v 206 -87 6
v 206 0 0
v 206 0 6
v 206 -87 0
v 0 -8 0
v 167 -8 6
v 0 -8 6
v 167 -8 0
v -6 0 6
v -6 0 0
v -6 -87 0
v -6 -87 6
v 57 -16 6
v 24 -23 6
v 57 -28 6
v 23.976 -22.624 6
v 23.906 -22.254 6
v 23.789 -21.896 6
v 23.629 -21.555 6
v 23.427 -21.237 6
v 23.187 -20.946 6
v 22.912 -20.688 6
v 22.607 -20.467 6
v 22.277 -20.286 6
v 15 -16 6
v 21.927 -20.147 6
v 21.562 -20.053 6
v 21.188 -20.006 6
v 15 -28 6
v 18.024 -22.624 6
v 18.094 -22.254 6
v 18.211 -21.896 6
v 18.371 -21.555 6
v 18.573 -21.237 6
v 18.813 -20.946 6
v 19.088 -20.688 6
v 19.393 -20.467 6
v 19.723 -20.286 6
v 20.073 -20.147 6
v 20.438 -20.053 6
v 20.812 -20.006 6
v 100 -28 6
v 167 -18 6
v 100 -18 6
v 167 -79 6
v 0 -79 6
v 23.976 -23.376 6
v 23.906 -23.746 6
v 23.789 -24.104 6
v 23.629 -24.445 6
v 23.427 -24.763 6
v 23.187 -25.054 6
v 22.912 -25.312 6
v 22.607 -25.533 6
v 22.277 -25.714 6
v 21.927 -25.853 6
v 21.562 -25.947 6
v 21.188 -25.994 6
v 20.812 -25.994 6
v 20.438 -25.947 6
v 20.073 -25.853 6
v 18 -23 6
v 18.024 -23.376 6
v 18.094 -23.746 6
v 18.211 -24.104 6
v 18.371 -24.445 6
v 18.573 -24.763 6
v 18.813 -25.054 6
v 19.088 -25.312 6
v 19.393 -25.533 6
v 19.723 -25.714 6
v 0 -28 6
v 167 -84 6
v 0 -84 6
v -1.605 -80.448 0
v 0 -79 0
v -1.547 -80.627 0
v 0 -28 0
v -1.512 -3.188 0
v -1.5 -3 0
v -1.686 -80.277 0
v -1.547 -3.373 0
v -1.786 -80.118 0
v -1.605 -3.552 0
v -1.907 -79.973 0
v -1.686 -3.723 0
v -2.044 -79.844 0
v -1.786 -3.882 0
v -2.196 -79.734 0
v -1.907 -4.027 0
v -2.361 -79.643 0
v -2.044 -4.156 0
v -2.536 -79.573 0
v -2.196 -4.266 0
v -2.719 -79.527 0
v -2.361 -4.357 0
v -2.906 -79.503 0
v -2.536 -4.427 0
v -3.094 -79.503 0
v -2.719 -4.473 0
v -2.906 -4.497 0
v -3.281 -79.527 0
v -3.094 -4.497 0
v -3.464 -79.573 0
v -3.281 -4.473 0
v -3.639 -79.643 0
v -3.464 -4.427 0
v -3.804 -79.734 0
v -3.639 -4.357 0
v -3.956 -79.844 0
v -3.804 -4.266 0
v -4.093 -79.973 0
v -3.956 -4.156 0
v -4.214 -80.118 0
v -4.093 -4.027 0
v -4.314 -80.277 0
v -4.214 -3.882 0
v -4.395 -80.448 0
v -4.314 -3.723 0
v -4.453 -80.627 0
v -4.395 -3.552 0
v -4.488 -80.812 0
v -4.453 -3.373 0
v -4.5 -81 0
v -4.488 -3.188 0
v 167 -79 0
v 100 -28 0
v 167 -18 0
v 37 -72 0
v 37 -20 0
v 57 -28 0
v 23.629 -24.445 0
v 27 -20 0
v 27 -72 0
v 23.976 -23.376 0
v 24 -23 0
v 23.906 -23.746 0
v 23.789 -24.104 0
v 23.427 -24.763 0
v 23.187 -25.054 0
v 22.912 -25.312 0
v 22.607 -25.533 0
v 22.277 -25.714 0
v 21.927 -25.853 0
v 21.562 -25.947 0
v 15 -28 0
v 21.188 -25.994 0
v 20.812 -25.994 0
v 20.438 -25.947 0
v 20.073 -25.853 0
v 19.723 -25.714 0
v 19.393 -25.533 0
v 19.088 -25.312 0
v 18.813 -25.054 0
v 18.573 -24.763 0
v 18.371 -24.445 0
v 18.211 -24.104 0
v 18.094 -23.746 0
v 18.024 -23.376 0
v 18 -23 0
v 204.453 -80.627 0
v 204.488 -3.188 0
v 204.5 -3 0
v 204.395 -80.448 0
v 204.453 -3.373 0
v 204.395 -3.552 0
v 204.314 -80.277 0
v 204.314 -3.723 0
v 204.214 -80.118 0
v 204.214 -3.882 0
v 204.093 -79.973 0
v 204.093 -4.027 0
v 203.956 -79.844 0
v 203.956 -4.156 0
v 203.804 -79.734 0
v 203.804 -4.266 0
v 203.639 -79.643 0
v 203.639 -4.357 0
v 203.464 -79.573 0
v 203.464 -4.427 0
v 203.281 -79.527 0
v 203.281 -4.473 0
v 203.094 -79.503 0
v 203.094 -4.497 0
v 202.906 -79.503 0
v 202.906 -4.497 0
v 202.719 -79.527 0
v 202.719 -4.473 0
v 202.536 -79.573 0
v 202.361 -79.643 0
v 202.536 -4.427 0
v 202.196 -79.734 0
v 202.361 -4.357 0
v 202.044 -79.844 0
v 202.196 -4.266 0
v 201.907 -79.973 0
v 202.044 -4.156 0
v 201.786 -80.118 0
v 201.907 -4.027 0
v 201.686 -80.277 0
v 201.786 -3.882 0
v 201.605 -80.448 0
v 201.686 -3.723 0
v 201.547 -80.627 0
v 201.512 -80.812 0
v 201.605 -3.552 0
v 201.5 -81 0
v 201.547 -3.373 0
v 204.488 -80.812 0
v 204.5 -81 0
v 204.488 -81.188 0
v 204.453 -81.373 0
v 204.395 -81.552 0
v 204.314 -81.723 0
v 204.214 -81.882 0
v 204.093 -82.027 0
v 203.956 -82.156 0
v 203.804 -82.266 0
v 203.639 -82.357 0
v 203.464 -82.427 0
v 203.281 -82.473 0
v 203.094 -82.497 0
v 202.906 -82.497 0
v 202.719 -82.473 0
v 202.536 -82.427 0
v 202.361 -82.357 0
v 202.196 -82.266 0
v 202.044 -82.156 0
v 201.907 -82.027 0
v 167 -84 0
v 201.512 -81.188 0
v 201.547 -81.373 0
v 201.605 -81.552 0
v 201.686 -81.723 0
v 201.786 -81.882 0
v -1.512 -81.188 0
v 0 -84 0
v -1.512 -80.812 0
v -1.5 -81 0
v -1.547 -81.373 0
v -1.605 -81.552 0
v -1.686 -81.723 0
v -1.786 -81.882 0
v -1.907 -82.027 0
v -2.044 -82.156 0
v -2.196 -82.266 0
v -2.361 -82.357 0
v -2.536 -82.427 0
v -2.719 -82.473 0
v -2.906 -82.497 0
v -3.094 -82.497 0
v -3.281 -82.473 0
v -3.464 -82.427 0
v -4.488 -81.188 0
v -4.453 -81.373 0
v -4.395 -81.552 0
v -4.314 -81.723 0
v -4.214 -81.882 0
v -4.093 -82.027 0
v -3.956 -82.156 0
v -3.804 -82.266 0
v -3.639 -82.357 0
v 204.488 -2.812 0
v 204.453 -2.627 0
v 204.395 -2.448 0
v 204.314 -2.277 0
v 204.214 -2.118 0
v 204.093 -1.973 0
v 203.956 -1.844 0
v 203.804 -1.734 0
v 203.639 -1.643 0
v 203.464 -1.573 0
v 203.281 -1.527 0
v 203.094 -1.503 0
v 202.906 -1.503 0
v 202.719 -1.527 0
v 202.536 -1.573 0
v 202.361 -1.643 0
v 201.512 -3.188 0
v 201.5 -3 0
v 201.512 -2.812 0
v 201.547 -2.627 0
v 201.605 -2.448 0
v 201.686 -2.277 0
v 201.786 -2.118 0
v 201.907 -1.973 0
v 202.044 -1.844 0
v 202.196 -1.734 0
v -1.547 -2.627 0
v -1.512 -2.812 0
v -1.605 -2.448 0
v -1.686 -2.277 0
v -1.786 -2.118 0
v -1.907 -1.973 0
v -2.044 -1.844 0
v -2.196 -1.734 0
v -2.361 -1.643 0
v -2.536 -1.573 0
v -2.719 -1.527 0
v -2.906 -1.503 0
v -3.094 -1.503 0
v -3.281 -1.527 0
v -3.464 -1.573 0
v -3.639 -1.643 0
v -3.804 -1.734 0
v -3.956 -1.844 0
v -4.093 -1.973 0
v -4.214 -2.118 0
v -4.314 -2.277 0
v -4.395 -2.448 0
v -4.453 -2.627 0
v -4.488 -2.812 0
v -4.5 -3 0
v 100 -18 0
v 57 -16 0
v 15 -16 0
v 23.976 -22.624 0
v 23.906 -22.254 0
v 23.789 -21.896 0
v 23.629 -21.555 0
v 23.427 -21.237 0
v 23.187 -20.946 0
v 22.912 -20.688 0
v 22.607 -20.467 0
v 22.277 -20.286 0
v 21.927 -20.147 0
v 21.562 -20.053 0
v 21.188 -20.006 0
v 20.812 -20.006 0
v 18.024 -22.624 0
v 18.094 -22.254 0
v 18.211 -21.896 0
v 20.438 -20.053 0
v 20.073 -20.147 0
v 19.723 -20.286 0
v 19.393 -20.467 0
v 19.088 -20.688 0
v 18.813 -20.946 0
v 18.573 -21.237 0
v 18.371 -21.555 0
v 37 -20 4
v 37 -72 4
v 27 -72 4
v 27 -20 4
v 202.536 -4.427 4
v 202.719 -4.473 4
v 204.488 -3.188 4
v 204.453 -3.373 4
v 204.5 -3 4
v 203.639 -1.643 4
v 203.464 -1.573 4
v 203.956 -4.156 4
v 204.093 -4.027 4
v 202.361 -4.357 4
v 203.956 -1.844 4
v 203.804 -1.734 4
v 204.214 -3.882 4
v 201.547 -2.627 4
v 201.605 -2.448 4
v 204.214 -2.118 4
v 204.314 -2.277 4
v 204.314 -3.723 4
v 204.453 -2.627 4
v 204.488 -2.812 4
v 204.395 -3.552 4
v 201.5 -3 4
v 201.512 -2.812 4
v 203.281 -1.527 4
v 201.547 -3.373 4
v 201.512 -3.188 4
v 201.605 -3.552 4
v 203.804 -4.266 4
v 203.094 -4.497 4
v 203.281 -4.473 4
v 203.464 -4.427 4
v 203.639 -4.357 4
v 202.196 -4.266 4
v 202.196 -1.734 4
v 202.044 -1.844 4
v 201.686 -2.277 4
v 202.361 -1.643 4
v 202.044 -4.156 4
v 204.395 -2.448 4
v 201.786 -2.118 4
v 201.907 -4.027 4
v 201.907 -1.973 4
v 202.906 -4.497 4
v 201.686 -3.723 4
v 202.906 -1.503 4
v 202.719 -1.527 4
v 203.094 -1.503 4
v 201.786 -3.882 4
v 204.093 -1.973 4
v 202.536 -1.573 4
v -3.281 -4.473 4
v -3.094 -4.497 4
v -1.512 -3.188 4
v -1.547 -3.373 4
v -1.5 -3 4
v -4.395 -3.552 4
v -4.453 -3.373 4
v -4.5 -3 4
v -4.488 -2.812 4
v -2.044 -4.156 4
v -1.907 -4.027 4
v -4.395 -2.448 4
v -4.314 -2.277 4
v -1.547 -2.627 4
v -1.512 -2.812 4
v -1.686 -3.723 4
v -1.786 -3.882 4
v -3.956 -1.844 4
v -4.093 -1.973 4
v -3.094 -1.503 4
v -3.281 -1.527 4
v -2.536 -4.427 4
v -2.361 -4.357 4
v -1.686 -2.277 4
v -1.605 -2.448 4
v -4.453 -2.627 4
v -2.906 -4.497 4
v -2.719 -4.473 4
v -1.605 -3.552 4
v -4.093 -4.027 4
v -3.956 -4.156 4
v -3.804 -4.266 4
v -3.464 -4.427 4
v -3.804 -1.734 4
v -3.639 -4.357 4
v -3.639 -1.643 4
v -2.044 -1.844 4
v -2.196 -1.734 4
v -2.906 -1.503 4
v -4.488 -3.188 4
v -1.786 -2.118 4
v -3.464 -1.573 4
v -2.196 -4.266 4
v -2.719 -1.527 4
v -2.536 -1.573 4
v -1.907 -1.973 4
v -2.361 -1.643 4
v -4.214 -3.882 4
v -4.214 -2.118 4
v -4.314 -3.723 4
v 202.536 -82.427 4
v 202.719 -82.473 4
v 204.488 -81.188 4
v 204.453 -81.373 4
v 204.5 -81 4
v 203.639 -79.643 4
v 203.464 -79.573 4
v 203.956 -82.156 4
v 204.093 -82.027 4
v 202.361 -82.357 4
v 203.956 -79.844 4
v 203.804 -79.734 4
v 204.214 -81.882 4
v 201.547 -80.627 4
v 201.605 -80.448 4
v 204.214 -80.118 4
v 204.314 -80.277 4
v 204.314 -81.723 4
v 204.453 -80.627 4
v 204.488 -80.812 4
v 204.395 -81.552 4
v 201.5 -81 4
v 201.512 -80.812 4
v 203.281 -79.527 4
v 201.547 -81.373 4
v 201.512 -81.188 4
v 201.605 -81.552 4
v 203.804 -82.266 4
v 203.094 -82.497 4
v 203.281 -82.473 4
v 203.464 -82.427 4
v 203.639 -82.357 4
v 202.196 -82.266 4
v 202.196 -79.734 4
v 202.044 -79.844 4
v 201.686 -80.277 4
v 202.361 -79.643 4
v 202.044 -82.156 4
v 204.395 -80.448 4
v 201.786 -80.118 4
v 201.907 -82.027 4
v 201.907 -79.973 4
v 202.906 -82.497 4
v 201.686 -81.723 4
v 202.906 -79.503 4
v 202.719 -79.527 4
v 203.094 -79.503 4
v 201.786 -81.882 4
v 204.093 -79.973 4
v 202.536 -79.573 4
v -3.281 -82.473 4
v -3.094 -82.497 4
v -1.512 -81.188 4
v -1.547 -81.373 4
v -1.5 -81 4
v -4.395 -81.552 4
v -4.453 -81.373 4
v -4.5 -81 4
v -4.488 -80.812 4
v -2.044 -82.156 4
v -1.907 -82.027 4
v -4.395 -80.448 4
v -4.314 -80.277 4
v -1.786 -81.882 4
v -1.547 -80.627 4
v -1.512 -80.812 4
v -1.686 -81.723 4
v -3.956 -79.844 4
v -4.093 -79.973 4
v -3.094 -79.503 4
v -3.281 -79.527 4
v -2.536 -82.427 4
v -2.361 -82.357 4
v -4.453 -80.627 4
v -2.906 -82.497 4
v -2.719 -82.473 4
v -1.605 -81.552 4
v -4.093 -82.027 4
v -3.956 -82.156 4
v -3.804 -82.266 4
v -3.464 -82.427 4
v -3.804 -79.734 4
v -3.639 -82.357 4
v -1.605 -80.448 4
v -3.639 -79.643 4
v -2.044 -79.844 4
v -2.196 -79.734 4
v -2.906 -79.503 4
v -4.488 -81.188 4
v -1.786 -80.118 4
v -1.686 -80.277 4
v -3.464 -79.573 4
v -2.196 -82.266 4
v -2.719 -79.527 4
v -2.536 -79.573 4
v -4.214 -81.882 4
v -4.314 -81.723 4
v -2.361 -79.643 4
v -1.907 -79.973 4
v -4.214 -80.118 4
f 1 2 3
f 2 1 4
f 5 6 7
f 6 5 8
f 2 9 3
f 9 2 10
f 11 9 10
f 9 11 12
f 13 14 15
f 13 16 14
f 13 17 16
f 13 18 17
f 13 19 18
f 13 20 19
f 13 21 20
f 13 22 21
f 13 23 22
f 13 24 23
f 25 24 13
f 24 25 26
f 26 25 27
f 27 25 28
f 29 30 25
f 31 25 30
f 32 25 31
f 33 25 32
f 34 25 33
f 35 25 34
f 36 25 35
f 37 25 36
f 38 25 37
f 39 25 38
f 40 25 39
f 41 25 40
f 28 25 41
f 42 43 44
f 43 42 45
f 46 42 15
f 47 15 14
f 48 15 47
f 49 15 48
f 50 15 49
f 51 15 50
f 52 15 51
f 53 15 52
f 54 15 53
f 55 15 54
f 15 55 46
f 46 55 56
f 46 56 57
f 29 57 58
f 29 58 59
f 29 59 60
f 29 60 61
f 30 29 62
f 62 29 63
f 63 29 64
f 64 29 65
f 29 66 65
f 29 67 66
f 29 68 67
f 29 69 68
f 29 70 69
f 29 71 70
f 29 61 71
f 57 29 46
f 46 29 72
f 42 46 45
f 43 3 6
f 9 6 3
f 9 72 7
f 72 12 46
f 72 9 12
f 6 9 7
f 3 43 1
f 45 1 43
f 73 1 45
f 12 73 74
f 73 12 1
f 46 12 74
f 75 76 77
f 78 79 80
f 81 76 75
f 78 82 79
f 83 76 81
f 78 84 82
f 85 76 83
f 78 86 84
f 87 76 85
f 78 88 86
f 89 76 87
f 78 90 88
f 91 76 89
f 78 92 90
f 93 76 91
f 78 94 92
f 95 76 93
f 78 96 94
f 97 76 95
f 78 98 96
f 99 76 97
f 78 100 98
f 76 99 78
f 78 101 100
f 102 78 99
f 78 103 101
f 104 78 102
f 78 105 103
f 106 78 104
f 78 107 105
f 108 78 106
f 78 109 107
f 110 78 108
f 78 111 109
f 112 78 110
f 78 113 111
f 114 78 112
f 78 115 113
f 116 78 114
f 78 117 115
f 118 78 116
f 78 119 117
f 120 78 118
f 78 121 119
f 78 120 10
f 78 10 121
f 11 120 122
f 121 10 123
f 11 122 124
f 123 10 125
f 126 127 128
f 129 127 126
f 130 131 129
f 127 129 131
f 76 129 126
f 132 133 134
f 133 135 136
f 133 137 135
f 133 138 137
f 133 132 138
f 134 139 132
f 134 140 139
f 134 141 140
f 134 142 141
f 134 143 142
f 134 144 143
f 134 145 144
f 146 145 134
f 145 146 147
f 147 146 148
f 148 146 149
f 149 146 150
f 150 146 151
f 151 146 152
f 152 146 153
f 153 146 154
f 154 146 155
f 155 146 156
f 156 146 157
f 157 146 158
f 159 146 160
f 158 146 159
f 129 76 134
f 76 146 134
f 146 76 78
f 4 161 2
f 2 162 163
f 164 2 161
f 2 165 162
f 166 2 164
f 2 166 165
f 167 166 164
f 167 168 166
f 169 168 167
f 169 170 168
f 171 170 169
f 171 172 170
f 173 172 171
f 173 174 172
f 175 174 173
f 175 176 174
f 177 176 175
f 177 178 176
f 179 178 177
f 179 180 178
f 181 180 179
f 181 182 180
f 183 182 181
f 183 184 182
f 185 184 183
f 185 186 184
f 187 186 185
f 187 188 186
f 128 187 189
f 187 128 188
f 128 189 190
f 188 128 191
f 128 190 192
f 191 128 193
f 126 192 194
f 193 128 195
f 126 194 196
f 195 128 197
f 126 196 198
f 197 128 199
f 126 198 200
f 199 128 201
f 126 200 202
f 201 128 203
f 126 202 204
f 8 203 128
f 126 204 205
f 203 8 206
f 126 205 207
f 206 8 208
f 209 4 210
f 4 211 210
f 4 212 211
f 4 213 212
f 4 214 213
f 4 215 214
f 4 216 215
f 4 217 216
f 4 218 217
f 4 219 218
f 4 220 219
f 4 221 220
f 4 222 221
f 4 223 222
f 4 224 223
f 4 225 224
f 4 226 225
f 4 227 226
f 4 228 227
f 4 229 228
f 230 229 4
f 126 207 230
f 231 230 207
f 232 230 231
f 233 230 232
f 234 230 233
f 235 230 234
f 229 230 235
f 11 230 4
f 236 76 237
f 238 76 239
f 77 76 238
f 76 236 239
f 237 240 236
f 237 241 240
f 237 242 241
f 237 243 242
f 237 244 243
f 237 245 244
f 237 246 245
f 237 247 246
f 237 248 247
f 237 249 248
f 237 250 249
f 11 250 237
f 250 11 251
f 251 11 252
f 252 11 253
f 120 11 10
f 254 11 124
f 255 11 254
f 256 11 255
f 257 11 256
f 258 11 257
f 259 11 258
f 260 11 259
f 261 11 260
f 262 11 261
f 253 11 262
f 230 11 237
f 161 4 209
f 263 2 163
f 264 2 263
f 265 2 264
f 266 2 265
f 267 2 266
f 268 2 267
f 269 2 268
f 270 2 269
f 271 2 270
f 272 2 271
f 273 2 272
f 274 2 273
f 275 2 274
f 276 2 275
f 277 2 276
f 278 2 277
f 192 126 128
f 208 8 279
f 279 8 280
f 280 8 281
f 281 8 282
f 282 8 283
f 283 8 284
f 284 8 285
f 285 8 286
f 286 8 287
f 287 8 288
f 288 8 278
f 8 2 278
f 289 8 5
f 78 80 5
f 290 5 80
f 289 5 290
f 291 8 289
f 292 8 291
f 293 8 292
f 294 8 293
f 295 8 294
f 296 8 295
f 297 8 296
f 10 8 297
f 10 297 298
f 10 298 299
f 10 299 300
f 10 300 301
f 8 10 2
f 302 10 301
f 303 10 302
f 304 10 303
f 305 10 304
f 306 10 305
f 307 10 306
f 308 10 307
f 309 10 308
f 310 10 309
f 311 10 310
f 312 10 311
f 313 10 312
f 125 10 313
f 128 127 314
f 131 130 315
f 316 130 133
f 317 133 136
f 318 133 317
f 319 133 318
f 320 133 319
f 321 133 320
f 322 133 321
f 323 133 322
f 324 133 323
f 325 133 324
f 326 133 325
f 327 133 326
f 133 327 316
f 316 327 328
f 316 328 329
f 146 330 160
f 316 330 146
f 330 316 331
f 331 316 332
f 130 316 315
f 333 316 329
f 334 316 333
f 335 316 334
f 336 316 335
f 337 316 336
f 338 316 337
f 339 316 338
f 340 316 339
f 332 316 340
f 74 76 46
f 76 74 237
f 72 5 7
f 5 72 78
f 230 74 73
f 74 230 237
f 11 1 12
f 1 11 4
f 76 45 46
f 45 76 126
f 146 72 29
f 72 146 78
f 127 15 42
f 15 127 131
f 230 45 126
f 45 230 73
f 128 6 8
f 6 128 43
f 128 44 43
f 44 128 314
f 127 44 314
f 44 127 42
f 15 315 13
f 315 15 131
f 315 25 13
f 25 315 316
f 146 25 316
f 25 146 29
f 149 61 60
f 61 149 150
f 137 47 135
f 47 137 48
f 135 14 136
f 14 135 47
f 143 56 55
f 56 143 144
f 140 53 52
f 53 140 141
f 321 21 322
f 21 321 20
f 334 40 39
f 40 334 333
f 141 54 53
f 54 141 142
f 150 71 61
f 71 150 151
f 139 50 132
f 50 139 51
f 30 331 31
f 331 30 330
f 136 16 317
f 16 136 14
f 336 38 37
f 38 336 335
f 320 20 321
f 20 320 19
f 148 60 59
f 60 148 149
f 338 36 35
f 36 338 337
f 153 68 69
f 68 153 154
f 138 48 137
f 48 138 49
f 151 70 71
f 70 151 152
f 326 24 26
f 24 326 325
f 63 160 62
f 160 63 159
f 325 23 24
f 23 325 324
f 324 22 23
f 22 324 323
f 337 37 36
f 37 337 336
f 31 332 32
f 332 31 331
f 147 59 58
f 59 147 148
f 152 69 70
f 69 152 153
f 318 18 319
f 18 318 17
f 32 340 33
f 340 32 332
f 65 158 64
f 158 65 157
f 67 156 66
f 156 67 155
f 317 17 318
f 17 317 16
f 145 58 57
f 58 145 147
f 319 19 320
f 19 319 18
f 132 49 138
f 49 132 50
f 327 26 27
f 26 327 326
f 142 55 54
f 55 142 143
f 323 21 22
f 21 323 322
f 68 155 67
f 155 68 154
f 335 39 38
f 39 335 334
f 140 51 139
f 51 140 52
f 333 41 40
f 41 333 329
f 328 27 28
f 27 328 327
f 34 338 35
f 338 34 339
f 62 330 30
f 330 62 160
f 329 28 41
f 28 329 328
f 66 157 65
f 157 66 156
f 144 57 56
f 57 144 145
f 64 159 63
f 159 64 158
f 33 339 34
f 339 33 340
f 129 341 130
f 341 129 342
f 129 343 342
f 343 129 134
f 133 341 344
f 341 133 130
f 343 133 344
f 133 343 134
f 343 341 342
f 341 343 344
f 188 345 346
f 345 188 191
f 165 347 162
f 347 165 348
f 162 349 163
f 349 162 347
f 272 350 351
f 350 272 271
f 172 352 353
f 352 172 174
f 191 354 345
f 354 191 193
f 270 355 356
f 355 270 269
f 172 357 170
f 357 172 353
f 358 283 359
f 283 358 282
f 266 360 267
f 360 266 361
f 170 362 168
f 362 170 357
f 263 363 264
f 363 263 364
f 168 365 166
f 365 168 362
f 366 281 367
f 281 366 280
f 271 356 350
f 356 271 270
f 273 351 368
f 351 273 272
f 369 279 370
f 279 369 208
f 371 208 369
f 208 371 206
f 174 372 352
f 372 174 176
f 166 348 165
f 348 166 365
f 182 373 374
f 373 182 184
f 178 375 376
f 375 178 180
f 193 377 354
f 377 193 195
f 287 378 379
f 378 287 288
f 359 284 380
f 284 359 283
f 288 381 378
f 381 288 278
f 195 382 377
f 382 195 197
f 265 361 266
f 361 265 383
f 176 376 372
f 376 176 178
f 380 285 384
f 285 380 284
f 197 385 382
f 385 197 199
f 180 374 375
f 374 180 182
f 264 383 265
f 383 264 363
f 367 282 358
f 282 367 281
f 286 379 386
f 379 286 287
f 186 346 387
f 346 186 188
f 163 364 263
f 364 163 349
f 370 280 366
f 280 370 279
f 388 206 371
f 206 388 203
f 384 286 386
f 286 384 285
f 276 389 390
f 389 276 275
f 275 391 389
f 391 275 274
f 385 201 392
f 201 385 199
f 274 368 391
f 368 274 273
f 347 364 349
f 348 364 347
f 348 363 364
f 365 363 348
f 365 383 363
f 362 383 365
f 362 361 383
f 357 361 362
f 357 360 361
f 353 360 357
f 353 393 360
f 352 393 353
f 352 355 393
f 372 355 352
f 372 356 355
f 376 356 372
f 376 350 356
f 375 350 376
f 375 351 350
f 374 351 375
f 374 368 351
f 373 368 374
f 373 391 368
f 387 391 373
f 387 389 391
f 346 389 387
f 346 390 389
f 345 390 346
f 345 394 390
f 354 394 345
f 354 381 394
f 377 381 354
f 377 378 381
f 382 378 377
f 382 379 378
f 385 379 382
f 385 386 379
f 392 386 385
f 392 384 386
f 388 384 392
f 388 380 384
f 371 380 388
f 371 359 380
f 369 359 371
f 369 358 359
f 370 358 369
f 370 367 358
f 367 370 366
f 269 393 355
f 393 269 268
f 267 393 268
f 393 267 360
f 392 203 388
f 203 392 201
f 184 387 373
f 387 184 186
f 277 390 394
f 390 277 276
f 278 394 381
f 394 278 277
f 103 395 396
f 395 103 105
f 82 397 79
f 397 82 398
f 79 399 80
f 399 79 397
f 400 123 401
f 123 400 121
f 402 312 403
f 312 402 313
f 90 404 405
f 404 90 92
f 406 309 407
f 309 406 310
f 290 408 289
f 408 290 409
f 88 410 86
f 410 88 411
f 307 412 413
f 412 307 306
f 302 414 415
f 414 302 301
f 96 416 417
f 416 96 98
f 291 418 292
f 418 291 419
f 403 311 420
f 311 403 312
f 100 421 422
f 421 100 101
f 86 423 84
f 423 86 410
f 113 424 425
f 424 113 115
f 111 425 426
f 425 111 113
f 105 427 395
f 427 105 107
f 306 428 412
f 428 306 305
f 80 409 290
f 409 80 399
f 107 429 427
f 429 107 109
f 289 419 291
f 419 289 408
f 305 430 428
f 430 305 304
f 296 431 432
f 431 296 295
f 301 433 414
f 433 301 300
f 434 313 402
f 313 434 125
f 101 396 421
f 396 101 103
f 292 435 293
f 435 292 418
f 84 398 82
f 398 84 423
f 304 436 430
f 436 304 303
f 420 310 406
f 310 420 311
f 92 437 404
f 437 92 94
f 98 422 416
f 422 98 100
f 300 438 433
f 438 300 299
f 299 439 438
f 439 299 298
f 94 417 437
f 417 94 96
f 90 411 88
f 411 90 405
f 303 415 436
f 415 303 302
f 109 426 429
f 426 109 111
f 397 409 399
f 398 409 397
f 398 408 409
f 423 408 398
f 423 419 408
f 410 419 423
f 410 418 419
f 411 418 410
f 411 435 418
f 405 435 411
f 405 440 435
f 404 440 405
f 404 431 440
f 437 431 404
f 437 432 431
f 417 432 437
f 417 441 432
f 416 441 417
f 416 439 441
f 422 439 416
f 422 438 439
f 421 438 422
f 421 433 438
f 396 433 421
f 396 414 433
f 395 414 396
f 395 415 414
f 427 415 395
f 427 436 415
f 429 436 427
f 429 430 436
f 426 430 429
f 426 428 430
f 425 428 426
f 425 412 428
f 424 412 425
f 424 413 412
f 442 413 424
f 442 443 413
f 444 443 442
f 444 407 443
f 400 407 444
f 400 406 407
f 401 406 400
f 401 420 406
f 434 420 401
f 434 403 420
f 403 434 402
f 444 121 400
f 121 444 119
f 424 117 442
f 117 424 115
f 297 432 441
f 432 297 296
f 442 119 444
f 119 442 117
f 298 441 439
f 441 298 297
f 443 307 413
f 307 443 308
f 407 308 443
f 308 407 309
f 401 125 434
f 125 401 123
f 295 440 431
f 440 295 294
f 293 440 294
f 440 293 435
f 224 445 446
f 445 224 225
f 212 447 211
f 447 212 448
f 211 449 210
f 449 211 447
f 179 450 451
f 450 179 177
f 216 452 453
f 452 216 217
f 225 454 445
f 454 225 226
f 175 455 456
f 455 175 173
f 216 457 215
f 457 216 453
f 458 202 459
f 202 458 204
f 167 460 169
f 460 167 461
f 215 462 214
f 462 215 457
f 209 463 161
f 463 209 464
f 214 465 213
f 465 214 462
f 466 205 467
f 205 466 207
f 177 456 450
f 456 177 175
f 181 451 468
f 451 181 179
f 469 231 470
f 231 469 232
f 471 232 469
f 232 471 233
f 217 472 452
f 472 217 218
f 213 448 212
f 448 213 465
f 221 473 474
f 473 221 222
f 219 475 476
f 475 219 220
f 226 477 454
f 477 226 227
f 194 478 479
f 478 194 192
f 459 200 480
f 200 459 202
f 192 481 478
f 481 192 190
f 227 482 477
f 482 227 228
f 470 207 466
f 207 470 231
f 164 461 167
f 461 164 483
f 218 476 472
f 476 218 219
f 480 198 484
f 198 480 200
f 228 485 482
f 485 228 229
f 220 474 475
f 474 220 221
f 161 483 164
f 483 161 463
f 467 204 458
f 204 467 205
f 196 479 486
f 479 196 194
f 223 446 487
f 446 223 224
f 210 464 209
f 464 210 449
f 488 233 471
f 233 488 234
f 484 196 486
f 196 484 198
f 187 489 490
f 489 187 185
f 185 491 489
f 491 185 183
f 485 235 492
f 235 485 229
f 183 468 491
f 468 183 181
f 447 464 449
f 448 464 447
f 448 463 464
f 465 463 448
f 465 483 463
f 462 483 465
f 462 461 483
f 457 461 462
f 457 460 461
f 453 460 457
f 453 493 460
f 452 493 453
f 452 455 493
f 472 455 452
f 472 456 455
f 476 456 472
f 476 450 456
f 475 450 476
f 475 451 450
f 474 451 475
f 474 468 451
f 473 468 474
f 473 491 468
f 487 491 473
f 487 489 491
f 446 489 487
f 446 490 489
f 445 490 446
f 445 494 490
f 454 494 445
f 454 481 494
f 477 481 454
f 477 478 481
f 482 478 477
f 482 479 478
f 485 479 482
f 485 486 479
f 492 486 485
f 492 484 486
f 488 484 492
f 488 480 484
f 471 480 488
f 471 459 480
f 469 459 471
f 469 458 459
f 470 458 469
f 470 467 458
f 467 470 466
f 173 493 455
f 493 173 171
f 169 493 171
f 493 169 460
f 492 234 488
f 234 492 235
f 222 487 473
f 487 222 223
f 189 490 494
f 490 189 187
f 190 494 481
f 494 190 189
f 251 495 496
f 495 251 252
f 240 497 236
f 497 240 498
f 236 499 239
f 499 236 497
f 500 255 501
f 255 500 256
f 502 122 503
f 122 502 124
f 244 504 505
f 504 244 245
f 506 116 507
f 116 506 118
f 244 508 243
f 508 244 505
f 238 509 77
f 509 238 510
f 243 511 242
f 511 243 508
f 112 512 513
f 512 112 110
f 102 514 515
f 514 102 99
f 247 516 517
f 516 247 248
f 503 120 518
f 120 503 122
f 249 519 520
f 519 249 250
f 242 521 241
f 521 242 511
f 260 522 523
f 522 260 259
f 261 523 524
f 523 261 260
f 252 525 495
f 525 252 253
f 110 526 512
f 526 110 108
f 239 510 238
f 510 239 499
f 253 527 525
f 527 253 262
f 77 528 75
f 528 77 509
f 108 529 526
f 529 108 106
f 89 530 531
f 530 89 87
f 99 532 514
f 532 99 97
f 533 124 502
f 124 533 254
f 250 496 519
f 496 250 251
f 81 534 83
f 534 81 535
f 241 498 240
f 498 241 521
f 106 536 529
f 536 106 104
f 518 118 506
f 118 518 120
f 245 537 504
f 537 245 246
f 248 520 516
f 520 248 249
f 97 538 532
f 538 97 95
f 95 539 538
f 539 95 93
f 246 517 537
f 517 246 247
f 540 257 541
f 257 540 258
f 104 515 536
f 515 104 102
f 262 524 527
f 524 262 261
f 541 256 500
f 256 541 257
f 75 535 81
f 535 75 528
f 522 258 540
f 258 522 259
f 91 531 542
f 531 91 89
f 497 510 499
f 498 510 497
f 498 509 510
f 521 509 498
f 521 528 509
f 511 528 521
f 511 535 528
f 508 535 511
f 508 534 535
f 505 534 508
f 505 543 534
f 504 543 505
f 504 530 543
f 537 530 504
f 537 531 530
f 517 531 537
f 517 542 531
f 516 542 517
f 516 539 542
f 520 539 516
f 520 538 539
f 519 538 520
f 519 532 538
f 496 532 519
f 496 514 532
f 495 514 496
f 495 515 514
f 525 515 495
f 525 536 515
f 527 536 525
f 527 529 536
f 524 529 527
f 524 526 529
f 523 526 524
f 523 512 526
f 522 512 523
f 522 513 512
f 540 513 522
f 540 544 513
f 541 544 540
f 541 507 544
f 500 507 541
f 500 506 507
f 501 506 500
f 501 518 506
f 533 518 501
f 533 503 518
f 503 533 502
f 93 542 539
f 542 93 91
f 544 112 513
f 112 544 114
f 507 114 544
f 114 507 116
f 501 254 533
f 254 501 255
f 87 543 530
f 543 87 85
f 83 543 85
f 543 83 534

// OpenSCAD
// file: hdd_caddy.scad
// Hard Drive Width
$hhdWidth = 102.5;

// Base Plate
$baseHeight_mm = 3;
$baseLength_mm = 136 - 5 - 5 + 13;
$baseWidth_mm = 115.5;
// Base Plate holes
$baseHoleWidth_mm = 37;
$baseHoleLength_mm = 52;

$secondRowHolesOffset = 30;

// Rails
$railHeight_mm = 11.5 + $secondRowHolesOffset + 4.5;
$railLength_mm = $baseLength_mm;
$railWidth_mm = ($baseWidth_mm - $hhdWidth) / 2;

// Rail Notch
$railNotchHeight = $railHeight_mm - 4;
$railNotchLength = $railLength_mm - 8;
$railNotchWidth = $railWidth_mm - 1;

// HDD hole locations starting from the back
$holeXAxisOffset_mm = 18;
$holeHeightOffset = $baseHeight_mm + 6;
$holeDiameter_mm = 4;


$holeOne = $holeXAxisOffset_mm + 6;
//$holeTwo = $holeXAxisOffset_mm + 37 + $holeDiameter_mm + 6;
$holeTwo = 84;
$holeThree = $holeXAxisOffset_mm + 97 + $holeDiameter_mm + 6;


module drawMounts() {
    // Draw the base unit
    union() {
        // Draw the first rail
        firstRail();

        // Draw the second rail
        secondRail();
    }
}



// It is really (x,y,z), but named differently because the rotate
// screws it up.
module screwHole(xOffset, zOffset, yOffset) {
    rotate(a=[90,0,0]) {
        translate([xOffset,yOffset,(0 - $railWidth_mm)-1]) {
            cylinder(h=$railWidth_mm+2, d=$holeDiameter_mm,$fn=20);
        }
    }
}
// main file
include <hdd_caddy.scad>;

$basePlateLength_mm = 170 + 30;
$basePlateWidth_mm = 100 + $baseWidth_mm - 8;
$basePlateHeight_mm = 3;
$wallHeight = 20 + $basePlateHeight_mm + $railHeight_mm + 15;
$wallWidth = 6;

$fn=50;


echo($wallHeight);


translate([0,0,-207.5]) rotate([90,0,0]) ioWall();

module ioWall() {
    $ioWallWidth = 6;
    
    

    difference() {
        union() {
            translate([0 - $wallWidth, $basePlateWidth_mm, 0]) {
                cube([$basePlateLength_mm + (2*$wallWidth), $ioWallWidth, 8]);
                cube([$wallWidth, $ioWallWidth, $wallHeight]);
                translate([0,0,$wallHeight]) cube([$basePlateLength_mm + (2*$wallWidth), $ioWallWidth, $basePlateHeight_mm]);
            }
            translate([15, $basePlateWidth_mm, 16]) {
                cube([42,$ioWallWidth,20]);
            }

            translate([0, $basePlateWidth_mm, 28]) {
                cube([$basePlateLength_mm, $ioWallWidth, 51]);
                translate([$basePlateLength_mm - 33,0,-23]) cube([39,$ioWallWidth,$wallHeight-5]);
                translate([$basePlateLength_mm - 100,0,-10]) cube([70,$ioWallWidth,20]);
            }
        }
        
        // Barrel Plug
        color([1,1,1]) translate([21,$basePlateWidth_mm+10,23]) rotate([90,0,0]) cylinder(d=6, h=20);
        
        // PCIE hole
        color([0.5,0.5,0.5]) translate([27, 145, 20]) cube([10,66.5,52]);
        
        translate([$basePlateLength_mm + 3,$basePlateWidth_mm+4,3]) rotate([90,0,0]) cylinder(d=3, h=4);
        translate([-3,$basePlateWidth_mm+4,3]) rotate([90,0,0]) cylinder(d=3, h=4);
        translate([$basePlateLength_mm + 3,$basePlateWidth_mm+4,$wallHeight-3]) rotate([90,0,0]) cylinder(d=3, h=4);
        translate([-3,$basePlateWidth_mm+4,$wallHeight-3]) rotate([90,0,0]) cylinder(d=3, h=4);
    }
}
